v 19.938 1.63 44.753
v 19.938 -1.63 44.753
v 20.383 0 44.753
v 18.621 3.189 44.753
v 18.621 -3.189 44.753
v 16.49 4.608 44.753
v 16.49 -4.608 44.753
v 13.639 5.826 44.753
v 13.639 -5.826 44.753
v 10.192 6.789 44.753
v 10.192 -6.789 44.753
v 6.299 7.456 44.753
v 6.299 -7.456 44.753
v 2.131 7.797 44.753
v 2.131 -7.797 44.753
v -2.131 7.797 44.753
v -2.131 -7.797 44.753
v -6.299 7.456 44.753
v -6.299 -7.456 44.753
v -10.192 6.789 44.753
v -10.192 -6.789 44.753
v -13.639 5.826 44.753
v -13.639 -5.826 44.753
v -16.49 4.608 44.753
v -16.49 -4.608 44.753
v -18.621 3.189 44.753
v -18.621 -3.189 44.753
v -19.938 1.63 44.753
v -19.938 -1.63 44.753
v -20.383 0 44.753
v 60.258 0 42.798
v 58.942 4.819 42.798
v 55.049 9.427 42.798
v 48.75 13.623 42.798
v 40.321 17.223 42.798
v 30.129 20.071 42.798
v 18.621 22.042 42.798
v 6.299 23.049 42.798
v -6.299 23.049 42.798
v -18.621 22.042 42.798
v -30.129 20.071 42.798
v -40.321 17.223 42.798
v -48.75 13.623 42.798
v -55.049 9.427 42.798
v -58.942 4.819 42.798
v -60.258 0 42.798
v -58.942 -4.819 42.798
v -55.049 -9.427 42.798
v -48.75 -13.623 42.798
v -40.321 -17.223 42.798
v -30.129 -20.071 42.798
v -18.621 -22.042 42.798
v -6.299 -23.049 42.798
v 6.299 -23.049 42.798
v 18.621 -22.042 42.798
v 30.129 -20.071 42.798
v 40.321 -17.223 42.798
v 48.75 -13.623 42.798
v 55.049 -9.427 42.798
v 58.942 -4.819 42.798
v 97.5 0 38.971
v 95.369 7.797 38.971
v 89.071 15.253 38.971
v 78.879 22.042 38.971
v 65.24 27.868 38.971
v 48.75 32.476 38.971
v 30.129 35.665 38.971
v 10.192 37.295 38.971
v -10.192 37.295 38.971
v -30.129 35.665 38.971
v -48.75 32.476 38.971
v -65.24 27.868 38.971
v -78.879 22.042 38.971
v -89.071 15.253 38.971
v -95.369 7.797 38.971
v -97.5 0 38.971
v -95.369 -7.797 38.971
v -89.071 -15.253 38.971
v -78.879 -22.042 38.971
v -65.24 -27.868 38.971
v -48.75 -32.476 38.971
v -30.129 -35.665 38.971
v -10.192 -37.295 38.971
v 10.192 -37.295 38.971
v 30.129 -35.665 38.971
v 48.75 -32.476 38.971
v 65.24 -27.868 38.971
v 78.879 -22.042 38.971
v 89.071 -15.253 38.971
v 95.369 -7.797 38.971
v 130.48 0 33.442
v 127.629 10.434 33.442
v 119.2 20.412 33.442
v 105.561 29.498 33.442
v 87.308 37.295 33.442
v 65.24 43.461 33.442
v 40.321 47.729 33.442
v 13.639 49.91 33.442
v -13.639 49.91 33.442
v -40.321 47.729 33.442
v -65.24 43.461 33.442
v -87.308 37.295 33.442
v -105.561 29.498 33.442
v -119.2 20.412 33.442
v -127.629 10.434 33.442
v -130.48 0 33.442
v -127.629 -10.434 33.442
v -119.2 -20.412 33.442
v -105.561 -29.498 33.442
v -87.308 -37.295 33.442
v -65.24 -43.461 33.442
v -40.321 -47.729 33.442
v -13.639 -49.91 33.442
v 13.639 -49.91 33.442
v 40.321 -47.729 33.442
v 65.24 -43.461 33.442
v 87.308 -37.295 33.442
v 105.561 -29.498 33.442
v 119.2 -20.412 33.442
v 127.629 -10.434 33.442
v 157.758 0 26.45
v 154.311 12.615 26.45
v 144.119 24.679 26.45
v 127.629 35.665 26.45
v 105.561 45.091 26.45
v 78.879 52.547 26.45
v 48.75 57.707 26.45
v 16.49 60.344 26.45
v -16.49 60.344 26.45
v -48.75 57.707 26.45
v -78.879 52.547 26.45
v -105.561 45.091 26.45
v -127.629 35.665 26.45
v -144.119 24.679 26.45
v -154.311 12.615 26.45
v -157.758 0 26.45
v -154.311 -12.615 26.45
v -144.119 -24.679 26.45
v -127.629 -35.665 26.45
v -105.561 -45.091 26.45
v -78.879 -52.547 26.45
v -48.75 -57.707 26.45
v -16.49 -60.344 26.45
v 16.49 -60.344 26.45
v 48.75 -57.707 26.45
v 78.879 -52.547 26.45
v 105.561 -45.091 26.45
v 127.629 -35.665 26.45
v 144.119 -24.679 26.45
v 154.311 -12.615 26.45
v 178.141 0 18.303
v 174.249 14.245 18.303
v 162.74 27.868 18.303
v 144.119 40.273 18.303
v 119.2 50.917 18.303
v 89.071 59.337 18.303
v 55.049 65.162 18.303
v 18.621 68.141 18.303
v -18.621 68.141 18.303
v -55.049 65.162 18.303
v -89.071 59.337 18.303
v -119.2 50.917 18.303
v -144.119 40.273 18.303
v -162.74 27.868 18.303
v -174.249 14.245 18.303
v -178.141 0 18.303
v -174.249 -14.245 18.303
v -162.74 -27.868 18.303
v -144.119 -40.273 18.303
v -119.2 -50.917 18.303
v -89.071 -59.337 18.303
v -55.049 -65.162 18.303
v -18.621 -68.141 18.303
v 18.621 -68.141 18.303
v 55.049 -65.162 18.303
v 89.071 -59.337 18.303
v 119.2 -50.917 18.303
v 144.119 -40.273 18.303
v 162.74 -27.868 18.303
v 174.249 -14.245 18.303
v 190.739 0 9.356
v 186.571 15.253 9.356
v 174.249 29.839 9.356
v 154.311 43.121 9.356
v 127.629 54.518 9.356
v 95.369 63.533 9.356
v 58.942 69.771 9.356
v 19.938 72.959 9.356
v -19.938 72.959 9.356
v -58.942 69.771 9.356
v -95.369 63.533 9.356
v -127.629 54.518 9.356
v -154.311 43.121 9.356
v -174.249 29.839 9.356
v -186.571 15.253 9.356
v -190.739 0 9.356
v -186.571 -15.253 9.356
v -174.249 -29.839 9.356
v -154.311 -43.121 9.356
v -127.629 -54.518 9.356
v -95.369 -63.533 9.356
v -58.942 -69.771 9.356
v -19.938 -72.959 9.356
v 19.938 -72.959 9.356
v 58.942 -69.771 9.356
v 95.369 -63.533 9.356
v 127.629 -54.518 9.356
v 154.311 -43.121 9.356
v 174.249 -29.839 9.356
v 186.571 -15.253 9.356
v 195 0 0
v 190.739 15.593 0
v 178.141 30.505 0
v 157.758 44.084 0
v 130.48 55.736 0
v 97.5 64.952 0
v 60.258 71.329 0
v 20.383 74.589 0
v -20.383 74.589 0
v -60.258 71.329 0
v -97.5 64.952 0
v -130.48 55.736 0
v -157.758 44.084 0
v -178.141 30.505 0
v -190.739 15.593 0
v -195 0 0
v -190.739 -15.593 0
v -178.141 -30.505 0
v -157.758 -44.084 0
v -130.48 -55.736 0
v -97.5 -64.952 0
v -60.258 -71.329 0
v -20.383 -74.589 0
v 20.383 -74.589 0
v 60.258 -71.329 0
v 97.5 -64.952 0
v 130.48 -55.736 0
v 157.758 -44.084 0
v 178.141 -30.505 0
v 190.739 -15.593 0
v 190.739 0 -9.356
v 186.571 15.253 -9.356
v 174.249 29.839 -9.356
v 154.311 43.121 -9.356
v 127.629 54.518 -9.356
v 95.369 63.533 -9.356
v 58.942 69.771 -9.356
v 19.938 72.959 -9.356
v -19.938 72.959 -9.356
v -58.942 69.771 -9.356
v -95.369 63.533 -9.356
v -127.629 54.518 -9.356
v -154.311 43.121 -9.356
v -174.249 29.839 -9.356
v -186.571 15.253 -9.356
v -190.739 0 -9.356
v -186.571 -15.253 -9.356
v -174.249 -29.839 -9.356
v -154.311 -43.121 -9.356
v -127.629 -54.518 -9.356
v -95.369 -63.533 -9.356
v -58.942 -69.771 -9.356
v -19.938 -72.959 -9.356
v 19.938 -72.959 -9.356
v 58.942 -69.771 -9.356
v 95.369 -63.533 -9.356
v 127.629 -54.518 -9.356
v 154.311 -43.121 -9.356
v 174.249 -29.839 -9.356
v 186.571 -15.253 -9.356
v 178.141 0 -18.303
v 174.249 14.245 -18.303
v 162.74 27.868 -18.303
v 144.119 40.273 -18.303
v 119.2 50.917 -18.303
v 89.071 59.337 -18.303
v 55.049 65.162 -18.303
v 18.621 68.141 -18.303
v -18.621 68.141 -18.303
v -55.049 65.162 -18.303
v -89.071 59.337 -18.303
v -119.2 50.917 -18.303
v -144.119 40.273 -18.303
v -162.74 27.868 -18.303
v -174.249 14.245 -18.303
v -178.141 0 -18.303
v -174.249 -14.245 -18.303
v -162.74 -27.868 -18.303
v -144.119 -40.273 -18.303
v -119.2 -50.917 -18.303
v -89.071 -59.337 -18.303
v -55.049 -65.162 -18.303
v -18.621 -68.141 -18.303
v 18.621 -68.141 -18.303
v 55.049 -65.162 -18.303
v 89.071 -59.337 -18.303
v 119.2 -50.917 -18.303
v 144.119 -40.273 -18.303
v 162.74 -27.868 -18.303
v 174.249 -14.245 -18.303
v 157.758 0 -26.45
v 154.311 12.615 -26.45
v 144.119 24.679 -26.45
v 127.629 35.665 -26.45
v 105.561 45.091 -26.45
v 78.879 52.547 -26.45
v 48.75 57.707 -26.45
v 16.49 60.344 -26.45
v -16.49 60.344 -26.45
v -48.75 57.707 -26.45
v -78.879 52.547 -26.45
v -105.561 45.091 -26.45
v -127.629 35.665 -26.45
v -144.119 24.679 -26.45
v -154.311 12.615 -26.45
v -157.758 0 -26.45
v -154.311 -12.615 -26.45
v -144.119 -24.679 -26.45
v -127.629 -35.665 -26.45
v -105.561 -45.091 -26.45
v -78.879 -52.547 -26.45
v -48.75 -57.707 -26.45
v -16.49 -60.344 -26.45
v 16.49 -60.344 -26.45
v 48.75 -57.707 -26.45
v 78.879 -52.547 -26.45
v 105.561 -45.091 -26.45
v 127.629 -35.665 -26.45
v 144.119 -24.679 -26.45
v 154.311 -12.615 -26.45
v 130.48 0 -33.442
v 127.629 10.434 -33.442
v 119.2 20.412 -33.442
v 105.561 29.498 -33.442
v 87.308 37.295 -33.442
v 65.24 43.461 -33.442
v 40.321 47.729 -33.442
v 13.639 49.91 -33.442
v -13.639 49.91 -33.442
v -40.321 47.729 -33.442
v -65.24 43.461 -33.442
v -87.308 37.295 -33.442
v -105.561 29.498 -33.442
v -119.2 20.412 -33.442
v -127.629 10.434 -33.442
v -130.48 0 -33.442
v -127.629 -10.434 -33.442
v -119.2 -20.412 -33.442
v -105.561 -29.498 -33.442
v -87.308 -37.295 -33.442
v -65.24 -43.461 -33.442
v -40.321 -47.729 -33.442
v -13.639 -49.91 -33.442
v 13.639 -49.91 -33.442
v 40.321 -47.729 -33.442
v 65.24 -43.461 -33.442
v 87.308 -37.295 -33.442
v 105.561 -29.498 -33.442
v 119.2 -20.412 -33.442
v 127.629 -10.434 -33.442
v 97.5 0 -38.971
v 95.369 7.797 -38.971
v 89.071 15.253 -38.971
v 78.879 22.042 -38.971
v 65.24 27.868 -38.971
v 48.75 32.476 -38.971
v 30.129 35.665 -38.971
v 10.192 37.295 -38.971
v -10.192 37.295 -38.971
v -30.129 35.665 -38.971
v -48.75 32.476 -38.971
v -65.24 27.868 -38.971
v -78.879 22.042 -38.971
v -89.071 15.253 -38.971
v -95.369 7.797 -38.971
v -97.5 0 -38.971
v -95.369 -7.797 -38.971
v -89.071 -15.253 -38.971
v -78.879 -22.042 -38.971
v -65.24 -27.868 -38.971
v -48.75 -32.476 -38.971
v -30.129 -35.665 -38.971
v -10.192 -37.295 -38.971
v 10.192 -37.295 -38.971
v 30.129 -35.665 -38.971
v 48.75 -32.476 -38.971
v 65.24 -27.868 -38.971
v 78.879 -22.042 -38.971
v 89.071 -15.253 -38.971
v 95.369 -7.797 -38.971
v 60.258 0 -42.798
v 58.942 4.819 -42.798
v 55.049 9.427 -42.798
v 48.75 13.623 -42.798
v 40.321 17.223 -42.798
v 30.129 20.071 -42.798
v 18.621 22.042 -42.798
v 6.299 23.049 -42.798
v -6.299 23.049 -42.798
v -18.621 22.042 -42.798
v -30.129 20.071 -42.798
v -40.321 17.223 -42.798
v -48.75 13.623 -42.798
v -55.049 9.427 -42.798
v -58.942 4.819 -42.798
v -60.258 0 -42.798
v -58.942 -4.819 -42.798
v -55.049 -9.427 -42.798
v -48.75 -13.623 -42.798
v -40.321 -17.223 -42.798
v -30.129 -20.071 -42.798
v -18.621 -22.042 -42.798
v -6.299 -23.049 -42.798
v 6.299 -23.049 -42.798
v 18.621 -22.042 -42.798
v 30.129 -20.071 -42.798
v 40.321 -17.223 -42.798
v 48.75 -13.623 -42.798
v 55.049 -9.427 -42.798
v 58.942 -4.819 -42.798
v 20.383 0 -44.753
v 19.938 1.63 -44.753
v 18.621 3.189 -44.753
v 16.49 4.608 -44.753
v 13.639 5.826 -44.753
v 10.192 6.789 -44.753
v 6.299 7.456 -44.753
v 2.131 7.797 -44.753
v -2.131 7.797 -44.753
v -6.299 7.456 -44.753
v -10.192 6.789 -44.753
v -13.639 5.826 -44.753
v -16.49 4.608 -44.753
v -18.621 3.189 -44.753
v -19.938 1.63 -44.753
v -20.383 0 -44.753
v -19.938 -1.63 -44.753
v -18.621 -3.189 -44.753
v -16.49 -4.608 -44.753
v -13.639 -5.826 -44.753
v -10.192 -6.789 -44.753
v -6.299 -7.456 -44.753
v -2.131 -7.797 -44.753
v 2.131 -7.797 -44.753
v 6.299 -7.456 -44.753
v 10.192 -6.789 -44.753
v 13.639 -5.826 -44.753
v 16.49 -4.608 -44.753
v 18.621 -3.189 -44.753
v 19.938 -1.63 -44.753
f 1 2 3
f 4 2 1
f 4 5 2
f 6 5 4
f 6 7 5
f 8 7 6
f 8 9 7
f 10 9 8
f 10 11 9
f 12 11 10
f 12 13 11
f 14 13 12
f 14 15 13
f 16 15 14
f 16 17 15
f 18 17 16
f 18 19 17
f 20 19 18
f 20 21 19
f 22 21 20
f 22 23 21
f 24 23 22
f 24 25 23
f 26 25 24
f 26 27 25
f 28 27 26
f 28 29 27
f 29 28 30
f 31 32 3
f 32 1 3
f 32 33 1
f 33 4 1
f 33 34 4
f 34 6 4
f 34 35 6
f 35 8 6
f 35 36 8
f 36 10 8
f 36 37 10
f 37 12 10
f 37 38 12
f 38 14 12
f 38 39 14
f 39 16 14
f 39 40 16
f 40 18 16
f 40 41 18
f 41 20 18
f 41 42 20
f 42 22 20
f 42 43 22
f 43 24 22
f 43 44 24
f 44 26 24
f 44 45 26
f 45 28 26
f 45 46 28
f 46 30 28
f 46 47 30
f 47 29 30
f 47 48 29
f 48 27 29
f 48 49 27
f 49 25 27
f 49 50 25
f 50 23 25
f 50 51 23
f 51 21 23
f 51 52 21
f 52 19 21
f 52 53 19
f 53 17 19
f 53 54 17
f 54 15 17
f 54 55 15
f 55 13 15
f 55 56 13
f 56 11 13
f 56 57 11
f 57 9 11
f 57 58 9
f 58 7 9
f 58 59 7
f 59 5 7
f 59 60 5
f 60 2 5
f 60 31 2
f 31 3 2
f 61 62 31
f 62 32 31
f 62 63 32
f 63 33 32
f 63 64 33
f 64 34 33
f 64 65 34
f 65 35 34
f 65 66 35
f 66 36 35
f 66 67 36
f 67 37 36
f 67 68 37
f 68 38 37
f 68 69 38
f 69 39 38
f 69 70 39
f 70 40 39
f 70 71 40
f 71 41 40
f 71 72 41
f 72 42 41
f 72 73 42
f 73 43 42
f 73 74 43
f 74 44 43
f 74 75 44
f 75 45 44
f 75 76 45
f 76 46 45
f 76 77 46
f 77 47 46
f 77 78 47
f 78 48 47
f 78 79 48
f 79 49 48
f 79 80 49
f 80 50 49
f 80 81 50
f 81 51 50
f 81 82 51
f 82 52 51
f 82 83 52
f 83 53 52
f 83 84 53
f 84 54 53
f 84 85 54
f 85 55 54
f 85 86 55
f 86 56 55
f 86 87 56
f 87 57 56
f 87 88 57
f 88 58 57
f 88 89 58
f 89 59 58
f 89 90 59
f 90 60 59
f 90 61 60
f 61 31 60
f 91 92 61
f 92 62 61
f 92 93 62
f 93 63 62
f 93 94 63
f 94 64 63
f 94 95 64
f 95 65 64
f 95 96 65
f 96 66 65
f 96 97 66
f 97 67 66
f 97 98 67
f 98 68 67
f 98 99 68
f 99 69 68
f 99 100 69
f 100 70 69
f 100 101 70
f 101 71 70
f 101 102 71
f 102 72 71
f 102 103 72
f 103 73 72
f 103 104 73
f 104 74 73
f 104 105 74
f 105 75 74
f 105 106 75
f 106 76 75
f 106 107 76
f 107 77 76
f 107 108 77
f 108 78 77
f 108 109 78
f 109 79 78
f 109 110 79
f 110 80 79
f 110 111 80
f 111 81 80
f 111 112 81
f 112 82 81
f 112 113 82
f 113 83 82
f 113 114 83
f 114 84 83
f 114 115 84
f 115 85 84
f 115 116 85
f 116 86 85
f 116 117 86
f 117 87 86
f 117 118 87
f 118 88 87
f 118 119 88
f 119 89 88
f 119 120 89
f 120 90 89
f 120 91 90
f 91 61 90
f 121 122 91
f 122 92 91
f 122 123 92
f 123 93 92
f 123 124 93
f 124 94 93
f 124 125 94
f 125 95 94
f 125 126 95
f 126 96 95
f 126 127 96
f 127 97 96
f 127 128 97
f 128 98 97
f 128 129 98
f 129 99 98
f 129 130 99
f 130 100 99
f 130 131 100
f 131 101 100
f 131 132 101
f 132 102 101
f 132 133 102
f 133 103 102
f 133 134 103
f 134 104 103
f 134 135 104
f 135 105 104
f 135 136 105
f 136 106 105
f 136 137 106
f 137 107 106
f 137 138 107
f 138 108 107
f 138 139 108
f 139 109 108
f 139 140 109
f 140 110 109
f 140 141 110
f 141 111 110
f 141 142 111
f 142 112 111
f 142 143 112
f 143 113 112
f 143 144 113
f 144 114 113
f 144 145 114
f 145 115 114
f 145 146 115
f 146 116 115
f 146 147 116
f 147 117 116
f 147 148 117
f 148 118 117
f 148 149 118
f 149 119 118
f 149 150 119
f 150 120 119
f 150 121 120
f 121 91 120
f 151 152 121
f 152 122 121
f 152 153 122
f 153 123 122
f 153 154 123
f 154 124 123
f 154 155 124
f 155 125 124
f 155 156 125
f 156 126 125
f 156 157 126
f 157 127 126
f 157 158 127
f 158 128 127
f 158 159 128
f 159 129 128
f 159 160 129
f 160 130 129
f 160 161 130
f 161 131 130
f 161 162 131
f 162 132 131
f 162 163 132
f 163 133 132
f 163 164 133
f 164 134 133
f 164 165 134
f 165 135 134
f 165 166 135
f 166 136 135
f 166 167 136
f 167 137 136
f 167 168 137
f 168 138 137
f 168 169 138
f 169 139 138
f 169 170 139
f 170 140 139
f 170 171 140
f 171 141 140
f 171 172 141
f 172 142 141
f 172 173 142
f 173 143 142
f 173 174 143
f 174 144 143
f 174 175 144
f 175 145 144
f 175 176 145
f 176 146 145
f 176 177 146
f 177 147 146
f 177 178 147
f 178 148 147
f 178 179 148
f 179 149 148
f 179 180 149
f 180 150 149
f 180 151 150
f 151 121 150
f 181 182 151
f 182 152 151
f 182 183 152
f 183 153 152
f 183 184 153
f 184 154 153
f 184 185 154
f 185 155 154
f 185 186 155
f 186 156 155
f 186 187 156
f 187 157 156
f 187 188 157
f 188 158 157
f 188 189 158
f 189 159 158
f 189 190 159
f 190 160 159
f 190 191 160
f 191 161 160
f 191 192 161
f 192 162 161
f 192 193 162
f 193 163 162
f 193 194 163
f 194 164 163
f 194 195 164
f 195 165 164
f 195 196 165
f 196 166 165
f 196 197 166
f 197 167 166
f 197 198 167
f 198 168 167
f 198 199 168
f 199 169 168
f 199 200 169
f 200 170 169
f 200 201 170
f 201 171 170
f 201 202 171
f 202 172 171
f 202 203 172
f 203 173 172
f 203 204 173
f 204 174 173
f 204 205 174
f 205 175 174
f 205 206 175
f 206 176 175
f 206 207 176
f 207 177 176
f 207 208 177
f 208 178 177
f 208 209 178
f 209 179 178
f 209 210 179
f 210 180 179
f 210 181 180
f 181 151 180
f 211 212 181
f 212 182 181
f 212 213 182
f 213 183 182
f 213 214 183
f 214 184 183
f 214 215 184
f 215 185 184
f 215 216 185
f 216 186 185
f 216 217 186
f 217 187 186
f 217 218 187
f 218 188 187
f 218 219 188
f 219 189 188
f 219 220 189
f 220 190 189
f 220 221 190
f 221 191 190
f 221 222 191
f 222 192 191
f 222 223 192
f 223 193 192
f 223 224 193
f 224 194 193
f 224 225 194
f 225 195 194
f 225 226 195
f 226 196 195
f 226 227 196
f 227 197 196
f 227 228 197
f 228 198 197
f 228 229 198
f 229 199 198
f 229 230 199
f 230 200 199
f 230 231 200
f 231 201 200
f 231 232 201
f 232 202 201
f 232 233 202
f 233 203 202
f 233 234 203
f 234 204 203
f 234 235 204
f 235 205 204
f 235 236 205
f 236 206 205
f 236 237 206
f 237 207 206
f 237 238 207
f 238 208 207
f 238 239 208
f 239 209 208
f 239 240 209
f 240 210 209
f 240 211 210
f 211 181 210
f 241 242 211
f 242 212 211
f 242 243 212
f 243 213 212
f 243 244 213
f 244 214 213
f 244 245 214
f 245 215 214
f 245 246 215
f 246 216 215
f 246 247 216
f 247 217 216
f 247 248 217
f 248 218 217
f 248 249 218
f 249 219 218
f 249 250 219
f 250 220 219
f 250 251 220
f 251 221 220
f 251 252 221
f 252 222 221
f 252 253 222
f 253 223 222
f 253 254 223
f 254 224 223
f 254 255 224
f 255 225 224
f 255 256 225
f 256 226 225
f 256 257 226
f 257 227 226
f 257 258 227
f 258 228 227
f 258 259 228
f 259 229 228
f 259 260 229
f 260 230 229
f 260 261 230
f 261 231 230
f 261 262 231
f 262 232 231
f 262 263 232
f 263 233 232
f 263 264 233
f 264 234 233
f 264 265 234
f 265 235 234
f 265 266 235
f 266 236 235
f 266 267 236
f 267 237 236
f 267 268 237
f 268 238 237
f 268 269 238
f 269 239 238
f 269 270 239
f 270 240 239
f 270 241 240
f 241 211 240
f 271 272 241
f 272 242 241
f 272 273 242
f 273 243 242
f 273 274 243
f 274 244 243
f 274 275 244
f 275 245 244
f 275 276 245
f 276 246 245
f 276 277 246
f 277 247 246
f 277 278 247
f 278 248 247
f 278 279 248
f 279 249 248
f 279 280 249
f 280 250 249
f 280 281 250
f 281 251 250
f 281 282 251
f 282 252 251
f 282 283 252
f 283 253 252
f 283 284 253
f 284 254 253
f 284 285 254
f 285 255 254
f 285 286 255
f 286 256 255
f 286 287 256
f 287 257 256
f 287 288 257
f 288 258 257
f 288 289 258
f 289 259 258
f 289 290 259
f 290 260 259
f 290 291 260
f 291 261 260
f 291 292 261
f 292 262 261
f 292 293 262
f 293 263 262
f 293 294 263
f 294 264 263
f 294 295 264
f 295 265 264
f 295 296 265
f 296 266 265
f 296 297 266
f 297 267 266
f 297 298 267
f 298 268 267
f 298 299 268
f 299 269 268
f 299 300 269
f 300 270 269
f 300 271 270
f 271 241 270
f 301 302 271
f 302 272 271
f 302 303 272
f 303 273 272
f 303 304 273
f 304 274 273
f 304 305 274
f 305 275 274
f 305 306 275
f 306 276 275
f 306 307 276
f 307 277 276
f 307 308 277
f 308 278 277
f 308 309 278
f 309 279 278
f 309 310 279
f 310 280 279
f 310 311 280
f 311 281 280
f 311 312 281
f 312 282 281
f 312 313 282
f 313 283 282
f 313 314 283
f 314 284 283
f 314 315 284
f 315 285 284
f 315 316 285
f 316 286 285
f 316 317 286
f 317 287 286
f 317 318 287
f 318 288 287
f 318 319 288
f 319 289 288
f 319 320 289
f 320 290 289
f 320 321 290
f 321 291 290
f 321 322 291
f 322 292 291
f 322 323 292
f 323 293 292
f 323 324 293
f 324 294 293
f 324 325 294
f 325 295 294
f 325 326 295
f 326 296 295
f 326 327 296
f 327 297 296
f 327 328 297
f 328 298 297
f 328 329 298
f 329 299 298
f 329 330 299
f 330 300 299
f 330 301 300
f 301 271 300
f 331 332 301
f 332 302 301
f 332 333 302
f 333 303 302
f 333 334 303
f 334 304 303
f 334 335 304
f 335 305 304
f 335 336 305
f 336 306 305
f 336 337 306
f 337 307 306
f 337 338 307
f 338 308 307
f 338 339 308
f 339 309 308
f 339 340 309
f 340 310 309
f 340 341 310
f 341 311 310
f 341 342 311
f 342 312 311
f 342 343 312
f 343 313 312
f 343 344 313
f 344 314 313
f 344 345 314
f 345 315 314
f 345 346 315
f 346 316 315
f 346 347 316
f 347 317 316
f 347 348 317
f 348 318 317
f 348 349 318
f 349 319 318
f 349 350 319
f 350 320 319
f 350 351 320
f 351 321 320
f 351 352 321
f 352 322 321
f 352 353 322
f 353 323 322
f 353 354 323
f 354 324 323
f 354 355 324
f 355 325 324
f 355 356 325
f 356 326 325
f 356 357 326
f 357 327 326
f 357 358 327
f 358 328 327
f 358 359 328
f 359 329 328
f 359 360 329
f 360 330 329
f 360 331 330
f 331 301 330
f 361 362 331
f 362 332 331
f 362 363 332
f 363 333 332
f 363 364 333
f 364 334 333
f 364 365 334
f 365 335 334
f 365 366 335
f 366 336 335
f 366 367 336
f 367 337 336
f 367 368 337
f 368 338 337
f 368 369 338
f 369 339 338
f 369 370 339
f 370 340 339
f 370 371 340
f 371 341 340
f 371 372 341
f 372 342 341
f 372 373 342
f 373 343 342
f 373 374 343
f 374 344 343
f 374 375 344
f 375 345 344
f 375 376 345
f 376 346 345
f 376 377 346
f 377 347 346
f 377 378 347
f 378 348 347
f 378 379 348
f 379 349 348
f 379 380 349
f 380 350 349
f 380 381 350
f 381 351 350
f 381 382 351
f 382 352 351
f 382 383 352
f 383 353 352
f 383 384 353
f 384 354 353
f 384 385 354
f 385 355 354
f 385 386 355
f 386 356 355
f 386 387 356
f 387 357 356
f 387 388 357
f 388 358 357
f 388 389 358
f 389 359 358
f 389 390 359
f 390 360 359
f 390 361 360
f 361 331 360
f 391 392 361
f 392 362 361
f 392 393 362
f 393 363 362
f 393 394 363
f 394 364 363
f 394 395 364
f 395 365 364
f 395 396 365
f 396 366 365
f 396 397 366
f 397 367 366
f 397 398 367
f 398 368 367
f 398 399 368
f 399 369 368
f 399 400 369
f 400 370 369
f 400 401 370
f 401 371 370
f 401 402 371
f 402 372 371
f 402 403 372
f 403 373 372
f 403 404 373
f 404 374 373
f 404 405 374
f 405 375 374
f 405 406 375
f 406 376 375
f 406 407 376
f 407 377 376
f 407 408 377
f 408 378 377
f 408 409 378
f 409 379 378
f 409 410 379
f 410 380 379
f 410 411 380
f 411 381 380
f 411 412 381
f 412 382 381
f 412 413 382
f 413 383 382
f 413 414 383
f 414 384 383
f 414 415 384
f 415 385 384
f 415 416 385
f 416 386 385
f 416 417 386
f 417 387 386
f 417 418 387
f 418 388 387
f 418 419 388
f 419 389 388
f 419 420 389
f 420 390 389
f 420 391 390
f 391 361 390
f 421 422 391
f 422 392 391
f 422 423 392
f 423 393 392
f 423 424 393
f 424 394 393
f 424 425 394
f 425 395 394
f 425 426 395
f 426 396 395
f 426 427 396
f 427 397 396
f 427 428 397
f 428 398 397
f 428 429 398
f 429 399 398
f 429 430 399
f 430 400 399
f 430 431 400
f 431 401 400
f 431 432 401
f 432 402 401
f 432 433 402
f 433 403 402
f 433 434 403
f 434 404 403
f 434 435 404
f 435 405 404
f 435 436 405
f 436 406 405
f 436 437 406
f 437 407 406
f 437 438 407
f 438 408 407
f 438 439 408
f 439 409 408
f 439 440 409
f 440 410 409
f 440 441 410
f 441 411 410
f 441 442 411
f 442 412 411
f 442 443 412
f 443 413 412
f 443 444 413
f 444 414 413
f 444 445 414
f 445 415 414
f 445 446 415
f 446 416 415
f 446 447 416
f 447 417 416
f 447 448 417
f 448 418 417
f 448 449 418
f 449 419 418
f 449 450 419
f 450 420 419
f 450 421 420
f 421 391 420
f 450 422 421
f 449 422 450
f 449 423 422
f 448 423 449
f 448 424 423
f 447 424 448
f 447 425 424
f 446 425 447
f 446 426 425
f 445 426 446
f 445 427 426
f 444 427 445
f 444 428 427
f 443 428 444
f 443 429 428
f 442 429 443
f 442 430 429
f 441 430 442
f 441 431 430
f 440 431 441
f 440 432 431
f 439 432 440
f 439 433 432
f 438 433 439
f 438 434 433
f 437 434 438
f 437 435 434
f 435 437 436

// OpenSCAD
// Generated by SolidPython 1.0.1 on 2020-07-29 00:46:50


scale(v = [13, 5, 3]) {
	sphere(r = 15);
}
/***********************************************
*********      SolidPython code:      **********
************************************************
 
# import packages: SolidPython
from solid import *
from solid.utils import *
from itertools import chain, combinations, permutations


class Resize:

    def __init__(self, scad_file):
        self.scad_file = scad_file
        #self.scad_file = import_scad(scad_file)
        # cone/cylinder param:
        self.r1 = 0
        self.r2 = 0
        self.h = 0
        # rectangular prism param:
        self.w = 0
        self.l = 0
        # ellipse param:
        self.r = 0

    # import OpenScad code (file name corresponds to shape)


    # classify shape + parameters
    def assign(self, param1, param2, param3):
        if self.scad_file == 'cone.scad':
            self.r1 = param1
            self.r2 = param2
            self.h = param3
        elif self.scad_file == 'cylinder.scad':
            self.r1 = param1
            self.r2 = param2
            self.h = param3
        elif self.scad_file == 'rectangularPrism.scad':
            self.h = param1
            self.l = param2
            self.w = param3
        else:
            self.r = param1
            self.h = param2

    # resize parameters
    def iterate(self):
        x = range(3, 20, 2)
        i = 1
        if self.scad_file == 'cone.scad':
            tempList = list(permutations(x, 2))
            for temp in tempList:
                param1 = temp[0]
                param2 = temp[1]
                filepath = 'produced_scad_files/' + 'cone' + str(param1) + '_' + str(param2) + '_' + '.scad'
                scad_render_to_file(cylinder(h=param1, r1=param2, r2=0), filepath)

        elif self.scad_file == 'cylinder.scad':
            tempList = list(permutations(x, 3))
            for temp in tempList:
                param1 = temp[0]
                param2 = temp[1]
                filepath = 'produced_scad_files/' + 'cylinder' + str(param1) + '_' + str(param2) + '_' + '.scad'
                scad_render_to_file(cylinder(h=param1, r1=param2, r2=param2), filepath)

        elif self.scad_file == 'rectangularPrism.scad':
            tempList = list(permutations(x, 3))
            for temp in tempList:
                param1 = temp[0]
                param2 = temp[1]
                param3 = temp[2]
                filepath = 'produced_scad_files/' + 'rectangularPrism' + str(param1) + '_' + str(param2) + '_' + str(
                    param3) + '.scad'
                scad_render_to_file(cube(size=(param1, param2, param3)), filepath)

        elif self.scad_file == 'ellipse.scad':
            tempList = list(permutations(x, 4))
            for temp in tempList:
                param1 = temp[0]
                param2 = temp[1]
                param3 = temp[2]
                param4 = temp[3]
                filepath = 'produced_scad_files/' + 'ellipse' + str(param1) + '_' + str(param2) + '_' + str(param3) + '_' + str(param4) + '.scad'
                scad_render_to_file(scale([param1, param2, param3])(sphere(r=param4)), filepath)

    def render_to_scadfile(self):
        scad_render_to_file(scad, 'example.scad') 
 
************************************************/
